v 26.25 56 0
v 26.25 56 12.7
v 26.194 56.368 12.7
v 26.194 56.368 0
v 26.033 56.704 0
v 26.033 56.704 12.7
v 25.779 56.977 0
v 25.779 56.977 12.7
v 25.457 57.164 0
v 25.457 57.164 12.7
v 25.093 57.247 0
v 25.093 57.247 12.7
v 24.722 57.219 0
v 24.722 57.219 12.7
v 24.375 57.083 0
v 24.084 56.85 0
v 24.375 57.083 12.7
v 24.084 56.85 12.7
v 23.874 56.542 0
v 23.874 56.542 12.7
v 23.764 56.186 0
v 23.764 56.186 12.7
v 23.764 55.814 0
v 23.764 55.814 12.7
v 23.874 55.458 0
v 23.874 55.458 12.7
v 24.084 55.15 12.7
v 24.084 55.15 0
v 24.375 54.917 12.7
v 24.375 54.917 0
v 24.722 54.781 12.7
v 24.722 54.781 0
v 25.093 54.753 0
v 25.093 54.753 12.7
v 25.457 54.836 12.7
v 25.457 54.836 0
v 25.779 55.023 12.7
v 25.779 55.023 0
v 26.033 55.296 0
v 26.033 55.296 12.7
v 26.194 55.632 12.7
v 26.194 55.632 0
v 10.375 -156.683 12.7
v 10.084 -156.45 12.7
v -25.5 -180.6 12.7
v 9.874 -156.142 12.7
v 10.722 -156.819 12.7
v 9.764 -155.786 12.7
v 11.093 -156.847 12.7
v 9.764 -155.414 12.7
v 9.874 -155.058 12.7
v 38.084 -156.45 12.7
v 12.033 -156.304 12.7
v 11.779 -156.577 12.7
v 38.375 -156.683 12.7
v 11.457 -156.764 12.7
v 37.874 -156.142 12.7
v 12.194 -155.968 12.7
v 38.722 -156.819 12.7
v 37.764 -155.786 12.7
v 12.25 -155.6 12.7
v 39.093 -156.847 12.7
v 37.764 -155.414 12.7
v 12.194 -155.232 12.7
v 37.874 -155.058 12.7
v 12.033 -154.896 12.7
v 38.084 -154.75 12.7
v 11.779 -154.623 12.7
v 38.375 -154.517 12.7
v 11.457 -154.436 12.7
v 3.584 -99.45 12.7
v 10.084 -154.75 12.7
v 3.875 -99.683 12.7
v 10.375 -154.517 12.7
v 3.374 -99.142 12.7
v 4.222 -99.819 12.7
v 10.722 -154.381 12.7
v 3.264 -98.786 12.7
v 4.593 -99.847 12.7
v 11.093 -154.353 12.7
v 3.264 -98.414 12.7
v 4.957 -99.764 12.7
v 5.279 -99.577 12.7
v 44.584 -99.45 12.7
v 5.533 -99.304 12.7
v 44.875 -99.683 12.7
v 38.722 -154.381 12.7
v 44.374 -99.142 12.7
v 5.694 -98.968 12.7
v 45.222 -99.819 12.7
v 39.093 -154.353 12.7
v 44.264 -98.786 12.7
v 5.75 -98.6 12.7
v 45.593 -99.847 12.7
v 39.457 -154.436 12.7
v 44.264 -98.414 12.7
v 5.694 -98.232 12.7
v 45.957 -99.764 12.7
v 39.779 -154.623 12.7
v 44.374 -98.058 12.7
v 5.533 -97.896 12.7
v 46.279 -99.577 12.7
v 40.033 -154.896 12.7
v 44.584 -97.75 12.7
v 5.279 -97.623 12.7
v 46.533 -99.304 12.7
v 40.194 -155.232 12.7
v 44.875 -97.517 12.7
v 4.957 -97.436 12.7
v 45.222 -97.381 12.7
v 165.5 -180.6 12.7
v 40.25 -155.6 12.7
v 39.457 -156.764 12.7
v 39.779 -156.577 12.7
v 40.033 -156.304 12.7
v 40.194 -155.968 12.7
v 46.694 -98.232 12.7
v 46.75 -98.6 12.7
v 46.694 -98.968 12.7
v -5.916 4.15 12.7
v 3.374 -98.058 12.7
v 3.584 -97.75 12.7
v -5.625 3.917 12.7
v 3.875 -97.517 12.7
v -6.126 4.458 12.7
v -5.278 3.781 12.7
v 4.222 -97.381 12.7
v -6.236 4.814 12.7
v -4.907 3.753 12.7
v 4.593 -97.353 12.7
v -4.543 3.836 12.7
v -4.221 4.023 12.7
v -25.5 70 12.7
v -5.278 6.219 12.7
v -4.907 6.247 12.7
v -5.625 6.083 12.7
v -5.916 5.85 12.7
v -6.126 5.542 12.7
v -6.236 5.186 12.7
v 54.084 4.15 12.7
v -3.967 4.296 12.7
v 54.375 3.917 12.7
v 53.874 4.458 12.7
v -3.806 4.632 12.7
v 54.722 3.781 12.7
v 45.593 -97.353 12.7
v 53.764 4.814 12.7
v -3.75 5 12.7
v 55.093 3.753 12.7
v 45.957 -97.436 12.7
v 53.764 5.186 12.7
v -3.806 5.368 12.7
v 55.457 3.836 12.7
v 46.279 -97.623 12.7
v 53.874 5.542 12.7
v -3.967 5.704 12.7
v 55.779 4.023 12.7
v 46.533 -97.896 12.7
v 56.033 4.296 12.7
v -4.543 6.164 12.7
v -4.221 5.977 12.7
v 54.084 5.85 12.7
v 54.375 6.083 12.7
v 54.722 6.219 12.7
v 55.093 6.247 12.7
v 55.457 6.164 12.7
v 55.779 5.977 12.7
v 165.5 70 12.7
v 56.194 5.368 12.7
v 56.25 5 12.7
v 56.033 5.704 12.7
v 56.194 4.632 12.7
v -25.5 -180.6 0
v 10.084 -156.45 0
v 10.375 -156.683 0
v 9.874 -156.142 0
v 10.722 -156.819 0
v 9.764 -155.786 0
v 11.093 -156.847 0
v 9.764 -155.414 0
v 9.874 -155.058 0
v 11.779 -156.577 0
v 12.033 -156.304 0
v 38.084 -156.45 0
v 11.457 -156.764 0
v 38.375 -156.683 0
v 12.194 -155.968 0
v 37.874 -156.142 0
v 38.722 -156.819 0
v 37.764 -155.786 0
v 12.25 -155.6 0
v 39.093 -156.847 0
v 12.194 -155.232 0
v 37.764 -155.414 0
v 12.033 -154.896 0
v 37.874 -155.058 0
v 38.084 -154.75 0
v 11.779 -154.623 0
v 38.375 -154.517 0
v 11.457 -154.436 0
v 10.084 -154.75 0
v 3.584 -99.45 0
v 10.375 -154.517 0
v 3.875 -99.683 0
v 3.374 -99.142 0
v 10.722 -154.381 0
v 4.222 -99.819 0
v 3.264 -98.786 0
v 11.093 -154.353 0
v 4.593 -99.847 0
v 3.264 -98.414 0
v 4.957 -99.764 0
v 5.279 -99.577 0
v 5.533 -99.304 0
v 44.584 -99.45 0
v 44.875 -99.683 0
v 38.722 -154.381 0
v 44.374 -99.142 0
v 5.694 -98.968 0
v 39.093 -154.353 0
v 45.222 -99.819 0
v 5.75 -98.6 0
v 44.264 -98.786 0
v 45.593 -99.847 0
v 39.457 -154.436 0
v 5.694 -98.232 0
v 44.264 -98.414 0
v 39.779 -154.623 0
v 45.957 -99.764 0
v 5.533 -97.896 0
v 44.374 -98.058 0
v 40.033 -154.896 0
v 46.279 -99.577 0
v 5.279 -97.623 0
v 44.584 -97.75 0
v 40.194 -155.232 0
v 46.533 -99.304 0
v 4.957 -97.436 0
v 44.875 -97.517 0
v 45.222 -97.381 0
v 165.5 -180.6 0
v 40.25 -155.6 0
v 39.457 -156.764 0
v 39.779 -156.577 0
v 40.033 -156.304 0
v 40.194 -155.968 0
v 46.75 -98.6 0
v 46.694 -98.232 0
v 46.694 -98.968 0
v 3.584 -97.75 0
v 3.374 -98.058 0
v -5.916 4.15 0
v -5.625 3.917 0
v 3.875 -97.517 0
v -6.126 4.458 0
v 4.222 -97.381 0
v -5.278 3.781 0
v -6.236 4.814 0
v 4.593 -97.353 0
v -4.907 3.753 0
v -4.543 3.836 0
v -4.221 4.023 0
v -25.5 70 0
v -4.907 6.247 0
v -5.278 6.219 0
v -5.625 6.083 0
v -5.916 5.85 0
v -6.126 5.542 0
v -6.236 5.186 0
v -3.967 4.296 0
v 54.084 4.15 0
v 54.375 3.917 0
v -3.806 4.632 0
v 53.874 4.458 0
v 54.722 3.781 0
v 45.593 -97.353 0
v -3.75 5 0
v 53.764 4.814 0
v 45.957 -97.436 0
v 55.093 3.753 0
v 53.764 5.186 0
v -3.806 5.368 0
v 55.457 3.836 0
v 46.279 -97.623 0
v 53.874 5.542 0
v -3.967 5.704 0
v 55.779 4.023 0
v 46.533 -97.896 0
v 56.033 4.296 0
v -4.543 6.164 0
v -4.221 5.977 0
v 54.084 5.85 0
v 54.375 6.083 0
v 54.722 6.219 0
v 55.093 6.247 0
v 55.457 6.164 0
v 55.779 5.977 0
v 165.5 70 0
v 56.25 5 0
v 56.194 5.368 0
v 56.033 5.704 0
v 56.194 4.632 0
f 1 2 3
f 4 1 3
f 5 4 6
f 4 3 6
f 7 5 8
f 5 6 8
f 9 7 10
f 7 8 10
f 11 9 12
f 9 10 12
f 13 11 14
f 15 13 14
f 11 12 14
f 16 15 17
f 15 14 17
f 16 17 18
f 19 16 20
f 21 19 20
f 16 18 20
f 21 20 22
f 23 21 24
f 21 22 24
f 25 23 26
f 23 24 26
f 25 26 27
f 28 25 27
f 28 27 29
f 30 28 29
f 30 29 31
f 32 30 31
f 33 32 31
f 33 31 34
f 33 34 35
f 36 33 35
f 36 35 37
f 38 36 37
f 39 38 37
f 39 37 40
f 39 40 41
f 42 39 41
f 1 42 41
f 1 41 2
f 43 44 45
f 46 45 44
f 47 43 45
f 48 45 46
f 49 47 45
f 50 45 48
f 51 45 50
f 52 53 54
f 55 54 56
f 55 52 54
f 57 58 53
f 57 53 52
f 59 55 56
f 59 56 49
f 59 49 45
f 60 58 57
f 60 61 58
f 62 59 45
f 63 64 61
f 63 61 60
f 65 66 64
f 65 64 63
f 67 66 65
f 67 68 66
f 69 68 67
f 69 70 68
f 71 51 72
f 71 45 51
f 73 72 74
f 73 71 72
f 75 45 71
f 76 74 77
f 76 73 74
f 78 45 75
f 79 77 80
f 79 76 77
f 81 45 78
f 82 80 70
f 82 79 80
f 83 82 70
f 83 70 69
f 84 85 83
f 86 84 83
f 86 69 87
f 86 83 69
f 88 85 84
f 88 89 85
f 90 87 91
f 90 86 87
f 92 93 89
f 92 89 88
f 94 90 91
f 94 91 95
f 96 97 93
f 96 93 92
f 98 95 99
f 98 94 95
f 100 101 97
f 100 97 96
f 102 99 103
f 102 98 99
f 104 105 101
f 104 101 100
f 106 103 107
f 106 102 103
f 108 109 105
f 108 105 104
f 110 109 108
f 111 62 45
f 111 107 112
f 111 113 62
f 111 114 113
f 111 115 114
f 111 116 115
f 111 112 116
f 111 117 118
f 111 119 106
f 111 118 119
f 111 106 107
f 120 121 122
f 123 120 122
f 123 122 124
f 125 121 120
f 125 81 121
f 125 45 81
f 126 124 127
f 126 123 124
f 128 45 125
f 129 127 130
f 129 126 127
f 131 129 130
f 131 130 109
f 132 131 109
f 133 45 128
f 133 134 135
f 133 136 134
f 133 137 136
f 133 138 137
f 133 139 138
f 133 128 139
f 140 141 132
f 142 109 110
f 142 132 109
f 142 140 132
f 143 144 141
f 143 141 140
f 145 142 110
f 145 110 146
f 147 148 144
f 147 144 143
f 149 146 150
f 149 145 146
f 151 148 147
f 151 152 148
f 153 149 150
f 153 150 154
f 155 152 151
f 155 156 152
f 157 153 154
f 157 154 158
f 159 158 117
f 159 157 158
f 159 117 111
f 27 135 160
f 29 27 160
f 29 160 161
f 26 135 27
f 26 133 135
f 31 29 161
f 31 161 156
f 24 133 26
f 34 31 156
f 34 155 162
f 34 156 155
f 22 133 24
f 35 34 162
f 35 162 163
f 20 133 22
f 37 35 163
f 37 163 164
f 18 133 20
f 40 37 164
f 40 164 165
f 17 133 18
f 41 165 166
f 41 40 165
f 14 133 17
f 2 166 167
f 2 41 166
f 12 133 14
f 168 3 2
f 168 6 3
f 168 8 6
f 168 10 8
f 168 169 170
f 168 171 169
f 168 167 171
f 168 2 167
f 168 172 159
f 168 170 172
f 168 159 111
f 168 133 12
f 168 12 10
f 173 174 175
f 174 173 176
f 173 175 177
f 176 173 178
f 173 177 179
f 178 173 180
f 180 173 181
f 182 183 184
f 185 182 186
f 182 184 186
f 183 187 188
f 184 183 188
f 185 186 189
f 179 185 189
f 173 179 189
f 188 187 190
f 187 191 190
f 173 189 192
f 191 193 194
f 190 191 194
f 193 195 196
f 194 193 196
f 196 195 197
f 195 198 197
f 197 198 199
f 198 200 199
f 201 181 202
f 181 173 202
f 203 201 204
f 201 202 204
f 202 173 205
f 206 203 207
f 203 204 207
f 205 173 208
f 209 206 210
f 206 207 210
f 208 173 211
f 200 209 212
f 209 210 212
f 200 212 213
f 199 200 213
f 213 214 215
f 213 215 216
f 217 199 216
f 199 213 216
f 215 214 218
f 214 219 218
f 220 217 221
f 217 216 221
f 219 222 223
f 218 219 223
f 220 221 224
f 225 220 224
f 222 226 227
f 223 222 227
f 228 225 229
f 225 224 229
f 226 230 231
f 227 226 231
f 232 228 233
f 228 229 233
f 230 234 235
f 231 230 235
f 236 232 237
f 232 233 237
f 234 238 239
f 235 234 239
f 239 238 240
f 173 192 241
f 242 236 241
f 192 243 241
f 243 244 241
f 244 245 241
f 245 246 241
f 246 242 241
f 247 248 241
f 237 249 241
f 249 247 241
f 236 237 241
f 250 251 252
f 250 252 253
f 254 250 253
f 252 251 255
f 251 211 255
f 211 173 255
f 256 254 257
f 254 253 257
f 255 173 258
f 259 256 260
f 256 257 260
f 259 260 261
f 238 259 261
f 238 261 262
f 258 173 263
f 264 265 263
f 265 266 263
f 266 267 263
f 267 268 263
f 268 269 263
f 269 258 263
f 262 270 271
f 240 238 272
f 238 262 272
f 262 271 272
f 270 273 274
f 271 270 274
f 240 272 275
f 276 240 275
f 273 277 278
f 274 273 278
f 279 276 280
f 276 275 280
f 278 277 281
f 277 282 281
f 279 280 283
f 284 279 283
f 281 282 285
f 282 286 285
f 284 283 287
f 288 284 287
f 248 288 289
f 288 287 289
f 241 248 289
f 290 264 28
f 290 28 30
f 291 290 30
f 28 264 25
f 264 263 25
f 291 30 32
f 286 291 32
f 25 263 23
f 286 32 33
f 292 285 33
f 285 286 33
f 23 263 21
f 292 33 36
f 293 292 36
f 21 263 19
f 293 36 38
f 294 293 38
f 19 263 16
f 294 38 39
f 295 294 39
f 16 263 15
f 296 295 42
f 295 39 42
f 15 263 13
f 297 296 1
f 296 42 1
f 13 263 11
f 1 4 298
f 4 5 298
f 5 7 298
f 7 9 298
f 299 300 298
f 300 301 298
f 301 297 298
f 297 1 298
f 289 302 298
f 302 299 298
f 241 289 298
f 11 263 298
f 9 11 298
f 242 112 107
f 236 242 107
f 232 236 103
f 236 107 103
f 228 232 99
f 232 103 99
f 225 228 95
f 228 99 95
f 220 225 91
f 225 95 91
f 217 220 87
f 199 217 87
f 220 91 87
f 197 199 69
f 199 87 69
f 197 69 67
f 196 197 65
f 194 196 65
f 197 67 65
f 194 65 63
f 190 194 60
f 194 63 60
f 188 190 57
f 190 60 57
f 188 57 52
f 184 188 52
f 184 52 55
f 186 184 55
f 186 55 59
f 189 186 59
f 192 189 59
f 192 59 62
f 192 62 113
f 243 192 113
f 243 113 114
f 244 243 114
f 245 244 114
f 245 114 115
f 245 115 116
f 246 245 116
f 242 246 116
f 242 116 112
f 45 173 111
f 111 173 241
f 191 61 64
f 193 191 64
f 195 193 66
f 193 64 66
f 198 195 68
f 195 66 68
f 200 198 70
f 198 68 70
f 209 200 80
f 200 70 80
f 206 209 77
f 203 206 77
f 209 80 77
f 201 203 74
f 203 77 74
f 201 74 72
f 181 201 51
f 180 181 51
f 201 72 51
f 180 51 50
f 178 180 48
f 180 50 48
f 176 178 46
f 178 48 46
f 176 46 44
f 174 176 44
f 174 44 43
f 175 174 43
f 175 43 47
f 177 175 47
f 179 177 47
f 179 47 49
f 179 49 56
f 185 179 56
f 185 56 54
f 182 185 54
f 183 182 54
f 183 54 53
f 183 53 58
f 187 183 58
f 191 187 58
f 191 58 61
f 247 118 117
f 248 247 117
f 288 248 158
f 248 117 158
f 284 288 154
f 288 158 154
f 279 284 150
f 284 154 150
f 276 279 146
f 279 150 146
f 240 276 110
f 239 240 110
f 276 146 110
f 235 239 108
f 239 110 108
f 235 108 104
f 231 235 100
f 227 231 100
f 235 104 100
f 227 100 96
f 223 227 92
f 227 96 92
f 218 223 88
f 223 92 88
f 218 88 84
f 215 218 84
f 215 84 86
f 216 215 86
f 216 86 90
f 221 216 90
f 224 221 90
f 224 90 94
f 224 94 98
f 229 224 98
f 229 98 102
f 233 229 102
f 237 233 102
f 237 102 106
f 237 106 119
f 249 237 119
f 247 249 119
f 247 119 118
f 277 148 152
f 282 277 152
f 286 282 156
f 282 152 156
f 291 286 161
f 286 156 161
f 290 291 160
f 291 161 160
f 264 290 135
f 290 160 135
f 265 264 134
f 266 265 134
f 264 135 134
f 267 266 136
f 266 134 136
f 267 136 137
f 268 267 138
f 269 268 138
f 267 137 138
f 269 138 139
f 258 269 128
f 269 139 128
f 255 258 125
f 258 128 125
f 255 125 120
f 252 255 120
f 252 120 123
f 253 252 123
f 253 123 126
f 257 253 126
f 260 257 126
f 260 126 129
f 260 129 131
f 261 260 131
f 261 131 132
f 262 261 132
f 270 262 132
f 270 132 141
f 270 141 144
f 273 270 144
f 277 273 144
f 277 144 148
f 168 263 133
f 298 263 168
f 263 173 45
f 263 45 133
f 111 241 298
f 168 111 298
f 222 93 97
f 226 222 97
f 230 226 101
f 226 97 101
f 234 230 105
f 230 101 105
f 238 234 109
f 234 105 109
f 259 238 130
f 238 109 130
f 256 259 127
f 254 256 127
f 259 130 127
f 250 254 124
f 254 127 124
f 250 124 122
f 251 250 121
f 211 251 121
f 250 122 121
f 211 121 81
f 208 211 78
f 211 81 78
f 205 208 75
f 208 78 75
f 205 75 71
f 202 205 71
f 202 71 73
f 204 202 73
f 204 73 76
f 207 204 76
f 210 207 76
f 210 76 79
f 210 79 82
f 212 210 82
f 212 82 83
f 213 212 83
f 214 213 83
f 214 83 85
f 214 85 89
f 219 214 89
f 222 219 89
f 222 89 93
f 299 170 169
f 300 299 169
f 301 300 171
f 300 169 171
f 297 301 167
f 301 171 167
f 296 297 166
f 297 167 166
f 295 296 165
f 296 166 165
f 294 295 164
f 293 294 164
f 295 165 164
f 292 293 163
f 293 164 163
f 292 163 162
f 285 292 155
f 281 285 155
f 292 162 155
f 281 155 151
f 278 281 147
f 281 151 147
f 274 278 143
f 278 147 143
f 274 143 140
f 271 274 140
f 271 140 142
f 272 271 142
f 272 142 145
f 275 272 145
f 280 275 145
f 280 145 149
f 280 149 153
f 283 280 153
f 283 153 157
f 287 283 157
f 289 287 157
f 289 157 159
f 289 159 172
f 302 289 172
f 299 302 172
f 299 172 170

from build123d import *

# Parameters (mm, degrees)
SKETCH1_W             = 191
SKETCH1_H             = 250.6
BOSS_EXTRUDE1_DEPTH   = 12.7
M3X0_5_TAPPED_HOLE1_D = 2.5


with BuildPart() as part:
    # Sketch1 → Boss-Extrude1 (new body)
    with BuildSketch(Plane.XY):
        with Locations((70, -55.3)):
            Rectangle(SKETCH1_W, SKETCH1_H)
    extrude(amount=BOSS_EXTRUDE1_DEPTH)

    # M3x0.5 Tapped Hole1 (through all)
    with Locations(Plane(origin=(0, 0, 0), x_dir=(-1, 0, 0), z_dir=(0, 0, -1))):
        with Locations((-25, 56), (-55, 5), (5, 5), (-45.5, -98.6), (-4.5, -98.6), (-11, -155.6), (-39, -155.6)):
            Hole(M3X0_5_TAPPED_HOLE1_D / 2)


solid = part.part
